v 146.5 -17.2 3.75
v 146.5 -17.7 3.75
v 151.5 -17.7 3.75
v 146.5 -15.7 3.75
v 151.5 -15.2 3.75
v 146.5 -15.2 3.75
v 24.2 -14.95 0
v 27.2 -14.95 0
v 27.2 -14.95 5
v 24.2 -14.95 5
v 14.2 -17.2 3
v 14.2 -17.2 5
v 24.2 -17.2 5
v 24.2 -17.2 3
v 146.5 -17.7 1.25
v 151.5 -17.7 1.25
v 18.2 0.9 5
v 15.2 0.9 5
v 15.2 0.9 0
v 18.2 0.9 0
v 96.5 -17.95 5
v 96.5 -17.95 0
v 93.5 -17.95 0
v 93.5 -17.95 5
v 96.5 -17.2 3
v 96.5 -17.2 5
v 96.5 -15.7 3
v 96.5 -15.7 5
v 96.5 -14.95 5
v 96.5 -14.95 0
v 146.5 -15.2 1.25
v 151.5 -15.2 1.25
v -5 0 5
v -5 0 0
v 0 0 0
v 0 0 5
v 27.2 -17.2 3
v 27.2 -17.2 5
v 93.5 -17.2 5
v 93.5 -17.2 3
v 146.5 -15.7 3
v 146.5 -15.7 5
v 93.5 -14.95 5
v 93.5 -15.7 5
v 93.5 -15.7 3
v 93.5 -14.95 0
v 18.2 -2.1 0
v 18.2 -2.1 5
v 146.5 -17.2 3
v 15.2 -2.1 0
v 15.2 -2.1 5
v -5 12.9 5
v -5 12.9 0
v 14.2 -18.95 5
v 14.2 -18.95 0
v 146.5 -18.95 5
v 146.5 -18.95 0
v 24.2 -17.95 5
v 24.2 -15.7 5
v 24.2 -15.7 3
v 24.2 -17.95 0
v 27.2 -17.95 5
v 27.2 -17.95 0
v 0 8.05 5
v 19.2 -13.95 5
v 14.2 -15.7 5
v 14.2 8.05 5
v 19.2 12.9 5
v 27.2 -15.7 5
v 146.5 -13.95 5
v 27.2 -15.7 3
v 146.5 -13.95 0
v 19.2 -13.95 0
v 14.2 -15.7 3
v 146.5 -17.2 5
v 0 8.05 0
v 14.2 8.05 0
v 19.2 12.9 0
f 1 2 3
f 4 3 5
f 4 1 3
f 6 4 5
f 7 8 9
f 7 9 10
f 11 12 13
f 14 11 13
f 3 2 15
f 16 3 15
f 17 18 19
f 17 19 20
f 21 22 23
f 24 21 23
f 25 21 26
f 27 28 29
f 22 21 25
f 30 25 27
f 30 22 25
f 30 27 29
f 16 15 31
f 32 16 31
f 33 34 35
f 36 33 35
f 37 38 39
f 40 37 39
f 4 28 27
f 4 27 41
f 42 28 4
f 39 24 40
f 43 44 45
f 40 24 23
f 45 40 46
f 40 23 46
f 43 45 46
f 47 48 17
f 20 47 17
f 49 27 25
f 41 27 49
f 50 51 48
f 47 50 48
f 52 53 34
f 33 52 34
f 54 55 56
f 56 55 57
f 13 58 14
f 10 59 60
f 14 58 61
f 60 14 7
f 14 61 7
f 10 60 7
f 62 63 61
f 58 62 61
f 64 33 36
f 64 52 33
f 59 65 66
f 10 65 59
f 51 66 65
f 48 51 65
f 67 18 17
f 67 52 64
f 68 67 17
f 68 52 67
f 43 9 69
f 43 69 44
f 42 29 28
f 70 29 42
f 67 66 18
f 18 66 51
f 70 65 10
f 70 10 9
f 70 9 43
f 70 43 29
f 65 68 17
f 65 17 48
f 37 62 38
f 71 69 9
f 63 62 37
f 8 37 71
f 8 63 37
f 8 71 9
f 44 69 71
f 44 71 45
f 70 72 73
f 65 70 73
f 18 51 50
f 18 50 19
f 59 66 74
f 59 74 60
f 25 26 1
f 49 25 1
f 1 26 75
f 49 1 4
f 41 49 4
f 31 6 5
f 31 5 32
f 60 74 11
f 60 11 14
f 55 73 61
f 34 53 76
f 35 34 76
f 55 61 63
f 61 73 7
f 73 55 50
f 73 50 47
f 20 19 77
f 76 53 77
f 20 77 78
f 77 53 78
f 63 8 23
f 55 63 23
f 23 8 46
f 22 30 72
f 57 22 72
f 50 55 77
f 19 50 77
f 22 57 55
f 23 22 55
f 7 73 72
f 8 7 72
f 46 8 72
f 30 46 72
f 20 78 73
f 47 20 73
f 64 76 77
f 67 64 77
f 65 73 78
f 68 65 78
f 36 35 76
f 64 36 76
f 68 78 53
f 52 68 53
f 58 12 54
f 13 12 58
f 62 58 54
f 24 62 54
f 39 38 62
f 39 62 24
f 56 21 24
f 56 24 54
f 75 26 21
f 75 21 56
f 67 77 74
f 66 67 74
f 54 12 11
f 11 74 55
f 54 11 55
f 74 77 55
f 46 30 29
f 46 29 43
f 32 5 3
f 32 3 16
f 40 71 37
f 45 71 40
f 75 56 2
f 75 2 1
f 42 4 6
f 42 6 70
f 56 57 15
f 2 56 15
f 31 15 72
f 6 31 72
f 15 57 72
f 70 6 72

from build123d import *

# Parameters (mm, degrees)
BOSS_EXTRUDE1_DEPTH = 5
SKETCH2_W           = 2.5
SKETCH2_H           = 2.5
BOSS_EXTRUDE2_DEPTH = 5
SKETCH3_W           = 3
SKETCH3_H           = 3
CUT_EXTRUDE1_DEPTH  = 10
SKETCH4_W           = 132.3
SKETCH4_H           = 1.5
CUT_EXTRUDE2_DEPTH  = 2
SKETCH5_W           = 3
SKETCH5_H           = 3
CUT_EXTRUDE3_DEPTH  = 12


with BuildPart() as part:
    # Sketch1 → Boss-Extrude1 (new body)
    with BuildSketch(Plane.XY):
        Polygon((0, 6.7), (0, 8.05), (5.5, 8.05), (14.2, 8.05), (14.2, -18.95), (146.5, -18.95), (146.5, -13.95), (19.2, -13.95), (19.2, 12.9), (5.5, 12.9), (-5, 12.9), (-5, 0), (0, 0), align=None)
    extrude(amount=BOSS_EXTRUDE1_DEPTH)

    # Sketch2 → Boss-Extrude2 (add)
    with BuildSketch(Plane(origin=(146.5, 0, 0), x_dir=(0, 0, -1), z_dir=(1, 0, 0))):
        with Locations((-2.5, -16.45)):
            Rectangle(SKETCH2_W, SKETCH2_H)
    extrude(amount=BOSS_EXTRUDE2_DEPTH)

    # Sketch3 → Cut-Extrude1 (cut)
    with BuildSketch(Plane.XY.offset(5)):
        with Locations((16.7, -0.6)):
            Rectangle(SKETCH3_W, SKETCH3_H)
    extrude(amount=-CUT_EXTRUDE1_DEPTH, mode=Mode.SUBTRACT)

    # Sketch4 → Cut-Extrude2 (cut)
    with BuildSketch(Plane.XY.offset(5)):
        with Locations((80.35, -16.45)):
            Rectangle(SKETCH4_W, SKETCH4_H)
    extrude(amount=-CUT_EXTRUDE2_DEPTH, mode=Mode.SUBTRACT)

    # Sketch5 → Cut-Extrude3 (cut)
    with BuildSketch(Plane(origin=(0, 0, 0), x_dir=(-1, 0, 0), z_dir=(0, 0, -1))):
        with Locations((-25.7, -16.45)):
            Rectangle(SKETCH5_W, SKETCH5_H)
        with Locations((-95, -16.45)):
            Rectangle(SKETCH5_W, SKETCH5_H)
    extrude(amount=-CUT_EXTRUDE3_DEPTH, mode=Mode.SUBTRACT)


solid = part.part
